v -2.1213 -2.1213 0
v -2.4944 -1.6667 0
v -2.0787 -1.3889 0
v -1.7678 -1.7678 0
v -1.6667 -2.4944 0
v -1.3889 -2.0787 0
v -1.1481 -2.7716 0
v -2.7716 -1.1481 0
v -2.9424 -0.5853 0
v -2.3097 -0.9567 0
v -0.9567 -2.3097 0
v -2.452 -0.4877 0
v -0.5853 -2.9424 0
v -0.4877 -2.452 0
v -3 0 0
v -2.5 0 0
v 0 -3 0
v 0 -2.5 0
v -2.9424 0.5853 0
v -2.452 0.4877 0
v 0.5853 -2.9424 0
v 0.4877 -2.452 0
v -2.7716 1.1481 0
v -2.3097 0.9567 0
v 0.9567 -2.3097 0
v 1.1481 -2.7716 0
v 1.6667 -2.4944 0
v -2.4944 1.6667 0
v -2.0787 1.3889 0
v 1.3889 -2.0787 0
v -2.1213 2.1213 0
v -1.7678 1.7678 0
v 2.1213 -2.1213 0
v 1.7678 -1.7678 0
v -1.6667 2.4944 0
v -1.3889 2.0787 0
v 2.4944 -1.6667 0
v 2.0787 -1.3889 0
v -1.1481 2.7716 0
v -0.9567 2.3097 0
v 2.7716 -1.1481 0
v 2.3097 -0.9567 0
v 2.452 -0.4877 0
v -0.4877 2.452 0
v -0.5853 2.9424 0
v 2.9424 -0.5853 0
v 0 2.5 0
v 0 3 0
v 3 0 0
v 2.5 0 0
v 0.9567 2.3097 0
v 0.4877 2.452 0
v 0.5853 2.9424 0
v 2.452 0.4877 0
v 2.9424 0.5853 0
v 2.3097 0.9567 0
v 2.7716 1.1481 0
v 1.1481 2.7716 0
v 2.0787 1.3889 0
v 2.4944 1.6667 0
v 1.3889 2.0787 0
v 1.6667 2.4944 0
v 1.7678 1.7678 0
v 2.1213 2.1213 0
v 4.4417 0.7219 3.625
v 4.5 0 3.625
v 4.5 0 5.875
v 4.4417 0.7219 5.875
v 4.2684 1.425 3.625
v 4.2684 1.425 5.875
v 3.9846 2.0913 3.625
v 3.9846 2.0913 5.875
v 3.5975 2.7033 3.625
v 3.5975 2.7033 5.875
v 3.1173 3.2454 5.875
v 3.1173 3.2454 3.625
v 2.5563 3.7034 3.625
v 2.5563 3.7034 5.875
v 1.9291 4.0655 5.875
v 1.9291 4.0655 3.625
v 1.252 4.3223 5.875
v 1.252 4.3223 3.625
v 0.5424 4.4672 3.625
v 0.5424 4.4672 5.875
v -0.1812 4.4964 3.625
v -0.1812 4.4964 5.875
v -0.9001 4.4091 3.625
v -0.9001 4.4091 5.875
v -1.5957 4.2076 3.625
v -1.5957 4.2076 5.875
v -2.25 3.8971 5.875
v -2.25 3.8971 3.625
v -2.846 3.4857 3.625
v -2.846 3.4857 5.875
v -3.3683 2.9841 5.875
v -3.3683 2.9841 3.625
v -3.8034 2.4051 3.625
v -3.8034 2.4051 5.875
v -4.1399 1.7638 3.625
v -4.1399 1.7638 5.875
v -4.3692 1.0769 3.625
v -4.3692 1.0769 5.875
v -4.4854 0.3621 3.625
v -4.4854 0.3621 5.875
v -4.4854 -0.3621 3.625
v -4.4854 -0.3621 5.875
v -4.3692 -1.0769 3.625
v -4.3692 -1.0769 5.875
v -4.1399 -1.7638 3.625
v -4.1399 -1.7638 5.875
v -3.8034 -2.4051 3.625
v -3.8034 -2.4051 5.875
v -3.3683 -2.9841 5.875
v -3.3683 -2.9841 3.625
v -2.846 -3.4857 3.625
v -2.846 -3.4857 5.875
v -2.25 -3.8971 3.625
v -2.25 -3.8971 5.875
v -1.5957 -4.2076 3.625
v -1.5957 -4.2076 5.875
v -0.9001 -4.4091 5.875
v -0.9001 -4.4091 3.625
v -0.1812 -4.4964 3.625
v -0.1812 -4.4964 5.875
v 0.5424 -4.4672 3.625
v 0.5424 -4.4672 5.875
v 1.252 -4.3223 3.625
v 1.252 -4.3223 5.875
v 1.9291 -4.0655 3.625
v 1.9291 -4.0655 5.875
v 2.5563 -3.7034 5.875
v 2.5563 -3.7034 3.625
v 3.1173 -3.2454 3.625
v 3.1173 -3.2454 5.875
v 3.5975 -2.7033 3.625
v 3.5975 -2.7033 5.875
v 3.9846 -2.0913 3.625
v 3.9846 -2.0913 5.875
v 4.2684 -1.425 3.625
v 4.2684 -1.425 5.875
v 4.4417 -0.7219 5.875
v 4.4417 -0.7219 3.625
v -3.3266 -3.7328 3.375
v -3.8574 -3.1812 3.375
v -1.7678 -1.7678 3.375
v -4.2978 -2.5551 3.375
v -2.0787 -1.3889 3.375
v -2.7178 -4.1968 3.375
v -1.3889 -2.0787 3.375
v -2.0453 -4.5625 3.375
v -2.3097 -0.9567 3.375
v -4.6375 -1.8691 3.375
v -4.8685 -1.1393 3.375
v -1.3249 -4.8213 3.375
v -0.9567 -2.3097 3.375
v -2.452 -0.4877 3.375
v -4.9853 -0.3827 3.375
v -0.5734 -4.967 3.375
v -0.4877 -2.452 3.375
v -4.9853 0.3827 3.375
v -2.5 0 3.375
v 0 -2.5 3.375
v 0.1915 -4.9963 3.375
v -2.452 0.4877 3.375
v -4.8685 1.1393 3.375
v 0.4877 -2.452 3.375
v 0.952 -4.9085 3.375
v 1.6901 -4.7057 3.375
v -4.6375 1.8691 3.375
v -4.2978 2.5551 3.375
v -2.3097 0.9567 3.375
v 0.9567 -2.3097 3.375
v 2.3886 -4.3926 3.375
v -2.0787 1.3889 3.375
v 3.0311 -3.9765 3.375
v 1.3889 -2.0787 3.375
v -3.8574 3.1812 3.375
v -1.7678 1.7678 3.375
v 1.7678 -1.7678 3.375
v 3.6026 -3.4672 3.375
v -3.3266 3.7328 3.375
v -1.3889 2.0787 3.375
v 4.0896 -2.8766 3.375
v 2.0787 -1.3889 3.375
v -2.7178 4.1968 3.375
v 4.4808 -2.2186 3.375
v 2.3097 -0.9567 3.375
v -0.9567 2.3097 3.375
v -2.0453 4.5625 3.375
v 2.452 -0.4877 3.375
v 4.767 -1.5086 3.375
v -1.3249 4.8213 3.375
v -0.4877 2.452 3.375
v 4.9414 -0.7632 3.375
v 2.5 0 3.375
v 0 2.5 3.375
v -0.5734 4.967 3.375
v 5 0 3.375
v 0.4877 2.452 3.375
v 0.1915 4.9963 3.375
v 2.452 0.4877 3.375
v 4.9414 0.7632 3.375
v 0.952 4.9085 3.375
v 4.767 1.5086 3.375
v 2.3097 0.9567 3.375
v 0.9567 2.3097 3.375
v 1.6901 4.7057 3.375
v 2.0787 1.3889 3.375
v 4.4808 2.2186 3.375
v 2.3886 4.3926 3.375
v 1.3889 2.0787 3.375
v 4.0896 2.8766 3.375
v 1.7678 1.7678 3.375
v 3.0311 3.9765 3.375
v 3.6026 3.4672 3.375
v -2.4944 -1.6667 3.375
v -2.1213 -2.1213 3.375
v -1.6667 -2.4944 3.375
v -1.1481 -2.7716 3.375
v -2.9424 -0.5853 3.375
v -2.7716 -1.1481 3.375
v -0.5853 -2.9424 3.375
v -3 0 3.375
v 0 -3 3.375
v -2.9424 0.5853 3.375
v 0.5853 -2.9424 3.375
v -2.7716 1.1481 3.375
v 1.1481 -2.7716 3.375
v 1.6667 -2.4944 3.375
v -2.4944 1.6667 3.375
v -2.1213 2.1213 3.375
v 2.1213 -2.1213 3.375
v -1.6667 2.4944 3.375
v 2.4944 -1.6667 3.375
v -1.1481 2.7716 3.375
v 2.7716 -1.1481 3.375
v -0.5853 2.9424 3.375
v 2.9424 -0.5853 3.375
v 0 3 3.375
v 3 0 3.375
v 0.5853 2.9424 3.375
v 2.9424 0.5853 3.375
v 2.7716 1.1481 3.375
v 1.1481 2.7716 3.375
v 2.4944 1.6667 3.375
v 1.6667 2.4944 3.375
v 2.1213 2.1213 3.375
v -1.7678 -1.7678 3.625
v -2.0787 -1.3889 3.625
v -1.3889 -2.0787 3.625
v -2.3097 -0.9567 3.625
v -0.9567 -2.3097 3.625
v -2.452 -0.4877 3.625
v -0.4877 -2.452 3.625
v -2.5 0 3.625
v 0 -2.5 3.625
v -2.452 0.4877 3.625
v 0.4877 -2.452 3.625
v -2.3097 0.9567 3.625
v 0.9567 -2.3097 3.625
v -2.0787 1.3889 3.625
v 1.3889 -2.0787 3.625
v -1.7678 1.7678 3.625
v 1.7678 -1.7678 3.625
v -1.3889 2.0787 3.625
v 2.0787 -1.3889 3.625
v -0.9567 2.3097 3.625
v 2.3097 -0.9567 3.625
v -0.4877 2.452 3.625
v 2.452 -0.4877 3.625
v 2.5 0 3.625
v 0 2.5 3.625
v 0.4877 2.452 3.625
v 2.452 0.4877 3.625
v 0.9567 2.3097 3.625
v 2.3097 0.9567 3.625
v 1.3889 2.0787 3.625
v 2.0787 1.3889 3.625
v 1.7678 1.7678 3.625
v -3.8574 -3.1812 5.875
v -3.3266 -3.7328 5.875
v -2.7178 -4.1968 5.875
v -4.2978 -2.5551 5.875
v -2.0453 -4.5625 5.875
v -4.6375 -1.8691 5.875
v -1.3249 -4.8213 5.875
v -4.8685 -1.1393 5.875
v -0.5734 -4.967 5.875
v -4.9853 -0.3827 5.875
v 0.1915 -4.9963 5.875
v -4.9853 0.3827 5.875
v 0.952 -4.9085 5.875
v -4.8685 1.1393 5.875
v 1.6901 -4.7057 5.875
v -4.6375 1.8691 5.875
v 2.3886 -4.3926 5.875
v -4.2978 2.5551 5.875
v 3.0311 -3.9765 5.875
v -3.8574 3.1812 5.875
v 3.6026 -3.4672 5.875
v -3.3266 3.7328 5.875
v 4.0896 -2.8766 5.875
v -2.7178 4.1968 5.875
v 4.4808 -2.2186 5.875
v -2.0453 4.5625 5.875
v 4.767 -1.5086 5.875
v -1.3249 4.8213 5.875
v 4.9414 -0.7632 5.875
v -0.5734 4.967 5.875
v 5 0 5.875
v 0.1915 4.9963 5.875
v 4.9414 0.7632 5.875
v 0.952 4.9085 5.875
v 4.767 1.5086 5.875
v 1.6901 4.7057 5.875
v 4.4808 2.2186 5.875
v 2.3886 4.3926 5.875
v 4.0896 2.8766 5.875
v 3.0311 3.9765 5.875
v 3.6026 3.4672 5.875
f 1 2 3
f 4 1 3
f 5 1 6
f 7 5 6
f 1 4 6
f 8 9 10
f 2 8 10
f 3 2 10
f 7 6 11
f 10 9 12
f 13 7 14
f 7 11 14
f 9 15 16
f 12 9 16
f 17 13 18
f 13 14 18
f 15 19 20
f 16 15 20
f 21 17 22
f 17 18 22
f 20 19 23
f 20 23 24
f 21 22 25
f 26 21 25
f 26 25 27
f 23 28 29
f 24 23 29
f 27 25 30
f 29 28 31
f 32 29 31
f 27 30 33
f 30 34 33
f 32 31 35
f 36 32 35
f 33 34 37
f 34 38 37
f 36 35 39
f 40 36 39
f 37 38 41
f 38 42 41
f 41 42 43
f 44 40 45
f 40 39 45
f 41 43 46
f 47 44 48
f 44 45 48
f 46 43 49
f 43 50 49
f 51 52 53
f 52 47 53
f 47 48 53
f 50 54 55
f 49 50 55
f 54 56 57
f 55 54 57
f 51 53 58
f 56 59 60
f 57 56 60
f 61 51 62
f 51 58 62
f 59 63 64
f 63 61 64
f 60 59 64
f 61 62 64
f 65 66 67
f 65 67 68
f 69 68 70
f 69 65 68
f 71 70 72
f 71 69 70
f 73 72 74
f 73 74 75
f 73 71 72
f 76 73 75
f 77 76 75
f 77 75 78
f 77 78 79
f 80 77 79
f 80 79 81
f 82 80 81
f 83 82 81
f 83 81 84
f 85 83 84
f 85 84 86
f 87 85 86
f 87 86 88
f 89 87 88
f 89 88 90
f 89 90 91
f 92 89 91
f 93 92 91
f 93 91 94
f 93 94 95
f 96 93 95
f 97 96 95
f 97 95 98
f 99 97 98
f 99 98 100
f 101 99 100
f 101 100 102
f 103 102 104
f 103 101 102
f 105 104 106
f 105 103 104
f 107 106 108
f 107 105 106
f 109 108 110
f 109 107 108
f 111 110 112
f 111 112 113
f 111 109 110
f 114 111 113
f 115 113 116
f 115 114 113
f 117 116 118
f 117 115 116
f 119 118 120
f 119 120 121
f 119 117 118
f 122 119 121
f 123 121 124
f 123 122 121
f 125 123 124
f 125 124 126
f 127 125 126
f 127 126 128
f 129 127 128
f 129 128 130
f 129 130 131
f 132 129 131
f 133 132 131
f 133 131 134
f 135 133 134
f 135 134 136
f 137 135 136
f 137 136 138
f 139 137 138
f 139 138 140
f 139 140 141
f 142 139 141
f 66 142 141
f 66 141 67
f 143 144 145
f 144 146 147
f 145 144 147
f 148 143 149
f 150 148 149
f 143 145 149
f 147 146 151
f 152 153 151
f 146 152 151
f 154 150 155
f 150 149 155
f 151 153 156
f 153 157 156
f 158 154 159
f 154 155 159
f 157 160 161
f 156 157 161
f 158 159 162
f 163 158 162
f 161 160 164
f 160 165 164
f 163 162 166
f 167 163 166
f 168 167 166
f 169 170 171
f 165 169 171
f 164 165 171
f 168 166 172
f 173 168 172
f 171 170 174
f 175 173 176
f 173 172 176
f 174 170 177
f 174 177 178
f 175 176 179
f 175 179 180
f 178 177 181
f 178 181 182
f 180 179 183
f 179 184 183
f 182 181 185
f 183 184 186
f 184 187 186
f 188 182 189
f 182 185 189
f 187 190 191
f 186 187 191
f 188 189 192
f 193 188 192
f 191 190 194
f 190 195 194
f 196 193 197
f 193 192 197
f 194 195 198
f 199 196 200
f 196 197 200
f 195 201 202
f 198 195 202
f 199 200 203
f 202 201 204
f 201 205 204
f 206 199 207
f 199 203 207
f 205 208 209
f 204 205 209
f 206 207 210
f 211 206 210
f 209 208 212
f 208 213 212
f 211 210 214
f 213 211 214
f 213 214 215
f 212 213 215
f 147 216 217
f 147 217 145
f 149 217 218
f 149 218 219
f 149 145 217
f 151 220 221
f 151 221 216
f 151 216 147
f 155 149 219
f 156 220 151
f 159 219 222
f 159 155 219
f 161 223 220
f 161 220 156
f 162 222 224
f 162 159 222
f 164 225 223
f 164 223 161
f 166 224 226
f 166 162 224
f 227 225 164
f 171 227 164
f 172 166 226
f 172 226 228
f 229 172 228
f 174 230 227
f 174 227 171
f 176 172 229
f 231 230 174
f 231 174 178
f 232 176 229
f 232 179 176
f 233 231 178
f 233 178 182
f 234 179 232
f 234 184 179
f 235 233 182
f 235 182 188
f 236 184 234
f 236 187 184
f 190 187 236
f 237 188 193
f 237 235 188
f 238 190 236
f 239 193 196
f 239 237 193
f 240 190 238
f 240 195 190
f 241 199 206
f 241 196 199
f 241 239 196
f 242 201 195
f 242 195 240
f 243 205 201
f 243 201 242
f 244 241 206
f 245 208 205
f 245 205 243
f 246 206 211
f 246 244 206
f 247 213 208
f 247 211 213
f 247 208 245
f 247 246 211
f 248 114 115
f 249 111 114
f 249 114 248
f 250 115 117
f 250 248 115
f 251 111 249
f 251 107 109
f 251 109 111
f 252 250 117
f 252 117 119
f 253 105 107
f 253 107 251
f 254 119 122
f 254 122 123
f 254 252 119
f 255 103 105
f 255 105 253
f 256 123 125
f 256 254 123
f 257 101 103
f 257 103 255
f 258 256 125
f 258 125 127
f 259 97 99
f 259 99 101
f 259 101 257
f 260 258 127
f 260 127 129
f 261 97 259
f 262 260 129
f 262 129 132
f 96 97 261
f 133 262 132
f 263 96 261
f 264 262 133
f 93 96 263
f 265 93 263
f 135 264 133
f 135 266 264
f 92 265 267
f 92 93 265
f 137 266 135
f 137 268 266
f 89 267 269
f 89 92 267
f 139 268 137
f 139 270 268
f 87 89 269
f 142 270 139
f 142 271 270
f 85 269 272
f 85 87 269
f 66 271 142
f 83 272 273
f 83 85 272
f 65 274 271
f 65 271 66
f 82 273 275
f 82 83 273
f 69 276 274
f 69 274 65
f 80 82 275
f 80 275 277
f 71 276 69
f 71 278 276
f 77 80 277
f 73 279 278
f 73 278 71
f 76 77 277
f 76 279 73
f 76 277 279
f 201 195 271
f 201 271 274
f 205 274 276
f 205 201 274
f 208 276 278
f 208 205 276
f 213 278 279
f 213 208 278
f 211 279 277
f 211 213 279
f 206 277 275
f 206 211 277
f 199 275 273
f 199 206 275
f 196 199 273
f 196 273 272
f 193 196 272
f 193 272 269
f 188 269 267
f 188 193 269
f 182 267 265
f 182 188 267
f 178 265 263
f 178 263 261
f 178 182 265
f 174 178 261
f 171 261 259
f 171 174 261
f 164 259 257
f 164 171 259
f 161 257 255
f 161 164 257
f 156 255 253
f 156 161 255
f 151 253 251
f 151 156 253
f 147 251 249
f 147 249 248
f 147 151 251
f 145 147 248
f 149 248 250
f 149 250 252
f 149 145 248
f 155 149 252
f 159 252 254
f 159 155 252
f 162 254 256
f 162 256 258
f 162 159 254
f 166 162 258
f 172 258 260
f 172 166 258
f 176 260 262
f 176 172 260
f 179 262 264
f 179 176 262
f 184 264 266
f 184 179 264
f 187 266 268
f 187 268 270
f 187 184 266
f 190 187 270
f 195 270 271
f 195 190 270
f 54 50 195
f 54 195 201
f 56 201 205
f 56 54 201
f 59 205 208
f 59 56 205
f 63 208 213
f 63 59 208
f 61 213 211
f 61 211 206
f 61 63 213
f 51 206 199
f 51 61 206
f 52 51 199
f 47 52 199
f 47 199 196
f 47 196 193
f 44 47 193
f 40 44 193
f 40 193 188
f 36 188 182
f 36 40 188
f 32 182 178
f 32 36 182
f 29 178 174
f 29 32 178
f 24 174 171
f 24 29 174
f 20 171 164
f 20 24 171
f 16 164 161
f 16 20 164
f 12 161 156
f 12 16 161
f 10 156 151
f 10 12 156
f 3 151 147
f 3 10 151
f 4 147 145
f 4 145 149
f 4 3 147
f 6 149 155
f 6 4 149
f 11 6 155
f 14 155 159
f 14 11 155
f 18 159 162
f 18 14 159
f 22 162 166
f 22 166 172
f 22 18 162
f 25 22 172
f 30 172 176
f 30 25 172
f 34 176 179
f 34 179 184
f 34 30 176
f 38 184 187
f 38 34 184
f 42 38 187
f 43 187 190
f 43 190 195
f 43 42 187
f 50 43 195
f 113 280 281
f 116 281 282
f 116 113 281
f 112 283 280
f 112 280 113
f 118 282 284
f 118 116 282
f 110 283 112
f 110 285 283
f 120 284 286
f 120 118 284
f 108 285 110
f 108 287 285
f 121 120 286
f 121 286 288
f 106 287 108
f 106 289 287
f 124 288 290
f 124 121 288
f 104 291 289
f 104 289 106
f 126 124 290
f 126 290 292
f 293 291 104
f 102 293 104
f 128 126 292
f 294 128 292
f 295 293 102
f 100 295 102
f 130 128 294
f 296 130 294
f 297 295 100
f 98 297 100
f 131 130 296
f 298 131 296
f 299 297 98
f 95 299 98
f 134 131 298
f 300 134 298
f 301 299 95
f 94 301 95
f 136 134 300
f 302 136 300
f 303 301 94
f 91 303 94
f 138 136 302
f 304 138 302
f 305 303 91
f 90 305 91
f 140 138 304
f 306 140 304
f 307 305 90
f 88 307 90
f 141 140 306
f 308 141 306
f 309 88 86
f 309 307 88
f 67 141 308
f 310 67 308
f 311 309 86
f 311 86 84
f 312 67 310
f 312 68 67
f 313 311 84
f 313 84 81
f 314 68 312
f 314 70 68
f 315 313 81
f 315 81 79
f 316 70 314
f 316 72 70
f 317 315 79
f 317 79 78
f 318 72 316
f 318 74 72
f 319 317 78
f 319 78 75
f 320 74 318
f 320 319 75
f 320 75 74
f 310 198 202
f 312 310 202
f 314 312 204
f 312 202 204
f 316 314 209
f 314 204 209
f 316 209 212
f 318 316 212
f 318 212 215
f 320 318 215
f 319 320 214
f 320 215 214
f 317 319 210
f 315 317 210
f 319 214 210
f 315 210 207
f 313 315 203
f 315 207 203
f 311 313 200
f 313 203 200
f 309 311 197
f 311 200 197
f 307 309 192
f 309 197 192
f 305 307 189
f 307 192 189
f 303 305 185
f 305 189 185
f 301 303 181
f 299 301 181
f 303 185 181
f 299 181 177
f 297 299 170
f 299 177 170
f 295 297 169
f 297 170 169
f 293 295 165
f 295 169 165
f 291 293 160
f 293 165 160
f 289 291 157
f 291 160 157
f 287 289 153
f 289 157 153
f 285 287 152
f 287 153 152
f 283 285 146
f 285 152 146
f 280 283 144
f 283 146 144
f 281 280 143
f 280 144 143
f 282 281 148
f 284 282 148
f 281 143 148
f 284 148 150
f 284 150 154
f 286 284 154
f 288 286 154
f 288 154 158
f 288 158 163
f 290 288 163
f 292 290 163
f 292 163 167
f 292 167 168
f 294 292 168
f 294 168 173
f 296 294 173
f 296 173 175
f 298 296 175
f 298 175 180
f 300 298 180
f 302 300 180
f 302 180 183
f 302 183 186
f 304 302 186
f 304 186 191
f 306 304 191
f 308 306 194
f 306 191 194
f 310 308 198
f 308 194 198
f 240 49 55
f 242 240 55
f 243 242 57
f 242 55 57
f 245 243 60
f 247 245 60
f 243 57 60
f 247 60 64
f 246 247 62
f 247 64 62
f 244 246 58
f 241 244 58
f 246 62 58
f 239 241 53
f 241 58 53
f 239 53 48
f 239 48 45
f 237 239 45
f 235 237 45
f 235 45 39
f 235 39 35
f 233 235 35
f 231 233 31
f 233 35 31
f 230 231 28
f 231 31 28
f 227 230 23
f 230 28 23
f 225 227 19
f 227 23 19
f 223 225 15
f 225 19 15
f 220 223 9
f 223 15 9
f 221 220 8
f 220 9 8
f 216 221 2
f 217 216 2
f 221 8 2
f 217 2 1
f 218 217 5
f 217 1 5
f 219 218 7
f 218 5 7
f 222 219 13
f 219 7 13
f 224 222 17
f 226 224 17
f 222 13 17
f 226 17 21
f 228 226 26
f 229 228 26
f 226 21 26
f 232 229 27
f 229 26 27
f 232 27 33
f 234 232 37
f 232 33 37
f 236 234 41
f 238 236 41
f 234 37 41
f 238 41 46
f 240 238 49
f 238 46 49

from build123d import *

# Parameters (mm, degrees)
SKETCH1_R           = 3
SKETCH1_R_2         = 2.5
BOSS_EXTRUDE1_DEPTH = 3.375
SKETCH2_R           = 5
SKETCH2_R_2         = 4.5
BOSS_EXTRUDE2_DEPTH = 2.5
SKETCH4_R           = 4.5
SKETCH4_R_2         = 2.5
BOSS_EXTRUDE5_DEPTH = 0.25


with BuildPart() as part:
    # Sketch1 → Boss-Extrude1 (new body)
    with BuildSketch(Plane.XY):
        Circle(SKETCH1_R)
        Circle(SKETCH1_R_2, mode=Mode.SUBTRACT)
    extrude(amount=BOSS_EXTRUDE1_DEPTH)


with BuildPart() as body_2:
    # Sketch2 → Boss-Extrude2 (new body)
    with BuildSketch(Plane.XY.offset(3.375)):
        Circle(SKETCH2_R)
        Circle(SKETCH2_R_2, mode=Mode.SUBTRACT)
    extrude(amount=BOSS_EXTRUDE2_DEPTH)

    # Sketch4 → Boss-Extrude5 (add)
    with BuildSketch(Plane.XY.offset(3.375)):
        Circle(SKETCH4_R)
        Circle(SKETCH4_R_2, mode=Mode.SUBTRACT)
    extrude(amount=BOSS_EXTRUDE5_DEPTH)


solid = Compound([part.part, body_2.part])
